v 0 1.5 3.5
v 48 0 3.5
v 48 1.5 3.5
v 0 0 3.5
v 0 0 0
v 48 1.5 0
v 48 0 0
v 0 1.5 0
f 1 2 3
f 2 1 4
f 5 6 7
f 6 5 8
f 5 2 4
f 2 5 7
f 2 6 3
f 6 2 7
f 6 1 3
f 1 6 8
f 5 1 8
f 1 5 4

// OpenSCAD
// file: standards.scad
////////////////////////////////////////////////////////////////////////////////
twoByFourWidth = 1.5;
twoByFourHeight = 3.5;
////////////////////////////////////////////////////////////////////////////////

enableDrywall = 1;
// main file
include<standards.scad>;

module twoByFour(length)
{
  cube([ length, twoByFourWidth, twoByFourHeight ]);
}

twoByFour(48);
